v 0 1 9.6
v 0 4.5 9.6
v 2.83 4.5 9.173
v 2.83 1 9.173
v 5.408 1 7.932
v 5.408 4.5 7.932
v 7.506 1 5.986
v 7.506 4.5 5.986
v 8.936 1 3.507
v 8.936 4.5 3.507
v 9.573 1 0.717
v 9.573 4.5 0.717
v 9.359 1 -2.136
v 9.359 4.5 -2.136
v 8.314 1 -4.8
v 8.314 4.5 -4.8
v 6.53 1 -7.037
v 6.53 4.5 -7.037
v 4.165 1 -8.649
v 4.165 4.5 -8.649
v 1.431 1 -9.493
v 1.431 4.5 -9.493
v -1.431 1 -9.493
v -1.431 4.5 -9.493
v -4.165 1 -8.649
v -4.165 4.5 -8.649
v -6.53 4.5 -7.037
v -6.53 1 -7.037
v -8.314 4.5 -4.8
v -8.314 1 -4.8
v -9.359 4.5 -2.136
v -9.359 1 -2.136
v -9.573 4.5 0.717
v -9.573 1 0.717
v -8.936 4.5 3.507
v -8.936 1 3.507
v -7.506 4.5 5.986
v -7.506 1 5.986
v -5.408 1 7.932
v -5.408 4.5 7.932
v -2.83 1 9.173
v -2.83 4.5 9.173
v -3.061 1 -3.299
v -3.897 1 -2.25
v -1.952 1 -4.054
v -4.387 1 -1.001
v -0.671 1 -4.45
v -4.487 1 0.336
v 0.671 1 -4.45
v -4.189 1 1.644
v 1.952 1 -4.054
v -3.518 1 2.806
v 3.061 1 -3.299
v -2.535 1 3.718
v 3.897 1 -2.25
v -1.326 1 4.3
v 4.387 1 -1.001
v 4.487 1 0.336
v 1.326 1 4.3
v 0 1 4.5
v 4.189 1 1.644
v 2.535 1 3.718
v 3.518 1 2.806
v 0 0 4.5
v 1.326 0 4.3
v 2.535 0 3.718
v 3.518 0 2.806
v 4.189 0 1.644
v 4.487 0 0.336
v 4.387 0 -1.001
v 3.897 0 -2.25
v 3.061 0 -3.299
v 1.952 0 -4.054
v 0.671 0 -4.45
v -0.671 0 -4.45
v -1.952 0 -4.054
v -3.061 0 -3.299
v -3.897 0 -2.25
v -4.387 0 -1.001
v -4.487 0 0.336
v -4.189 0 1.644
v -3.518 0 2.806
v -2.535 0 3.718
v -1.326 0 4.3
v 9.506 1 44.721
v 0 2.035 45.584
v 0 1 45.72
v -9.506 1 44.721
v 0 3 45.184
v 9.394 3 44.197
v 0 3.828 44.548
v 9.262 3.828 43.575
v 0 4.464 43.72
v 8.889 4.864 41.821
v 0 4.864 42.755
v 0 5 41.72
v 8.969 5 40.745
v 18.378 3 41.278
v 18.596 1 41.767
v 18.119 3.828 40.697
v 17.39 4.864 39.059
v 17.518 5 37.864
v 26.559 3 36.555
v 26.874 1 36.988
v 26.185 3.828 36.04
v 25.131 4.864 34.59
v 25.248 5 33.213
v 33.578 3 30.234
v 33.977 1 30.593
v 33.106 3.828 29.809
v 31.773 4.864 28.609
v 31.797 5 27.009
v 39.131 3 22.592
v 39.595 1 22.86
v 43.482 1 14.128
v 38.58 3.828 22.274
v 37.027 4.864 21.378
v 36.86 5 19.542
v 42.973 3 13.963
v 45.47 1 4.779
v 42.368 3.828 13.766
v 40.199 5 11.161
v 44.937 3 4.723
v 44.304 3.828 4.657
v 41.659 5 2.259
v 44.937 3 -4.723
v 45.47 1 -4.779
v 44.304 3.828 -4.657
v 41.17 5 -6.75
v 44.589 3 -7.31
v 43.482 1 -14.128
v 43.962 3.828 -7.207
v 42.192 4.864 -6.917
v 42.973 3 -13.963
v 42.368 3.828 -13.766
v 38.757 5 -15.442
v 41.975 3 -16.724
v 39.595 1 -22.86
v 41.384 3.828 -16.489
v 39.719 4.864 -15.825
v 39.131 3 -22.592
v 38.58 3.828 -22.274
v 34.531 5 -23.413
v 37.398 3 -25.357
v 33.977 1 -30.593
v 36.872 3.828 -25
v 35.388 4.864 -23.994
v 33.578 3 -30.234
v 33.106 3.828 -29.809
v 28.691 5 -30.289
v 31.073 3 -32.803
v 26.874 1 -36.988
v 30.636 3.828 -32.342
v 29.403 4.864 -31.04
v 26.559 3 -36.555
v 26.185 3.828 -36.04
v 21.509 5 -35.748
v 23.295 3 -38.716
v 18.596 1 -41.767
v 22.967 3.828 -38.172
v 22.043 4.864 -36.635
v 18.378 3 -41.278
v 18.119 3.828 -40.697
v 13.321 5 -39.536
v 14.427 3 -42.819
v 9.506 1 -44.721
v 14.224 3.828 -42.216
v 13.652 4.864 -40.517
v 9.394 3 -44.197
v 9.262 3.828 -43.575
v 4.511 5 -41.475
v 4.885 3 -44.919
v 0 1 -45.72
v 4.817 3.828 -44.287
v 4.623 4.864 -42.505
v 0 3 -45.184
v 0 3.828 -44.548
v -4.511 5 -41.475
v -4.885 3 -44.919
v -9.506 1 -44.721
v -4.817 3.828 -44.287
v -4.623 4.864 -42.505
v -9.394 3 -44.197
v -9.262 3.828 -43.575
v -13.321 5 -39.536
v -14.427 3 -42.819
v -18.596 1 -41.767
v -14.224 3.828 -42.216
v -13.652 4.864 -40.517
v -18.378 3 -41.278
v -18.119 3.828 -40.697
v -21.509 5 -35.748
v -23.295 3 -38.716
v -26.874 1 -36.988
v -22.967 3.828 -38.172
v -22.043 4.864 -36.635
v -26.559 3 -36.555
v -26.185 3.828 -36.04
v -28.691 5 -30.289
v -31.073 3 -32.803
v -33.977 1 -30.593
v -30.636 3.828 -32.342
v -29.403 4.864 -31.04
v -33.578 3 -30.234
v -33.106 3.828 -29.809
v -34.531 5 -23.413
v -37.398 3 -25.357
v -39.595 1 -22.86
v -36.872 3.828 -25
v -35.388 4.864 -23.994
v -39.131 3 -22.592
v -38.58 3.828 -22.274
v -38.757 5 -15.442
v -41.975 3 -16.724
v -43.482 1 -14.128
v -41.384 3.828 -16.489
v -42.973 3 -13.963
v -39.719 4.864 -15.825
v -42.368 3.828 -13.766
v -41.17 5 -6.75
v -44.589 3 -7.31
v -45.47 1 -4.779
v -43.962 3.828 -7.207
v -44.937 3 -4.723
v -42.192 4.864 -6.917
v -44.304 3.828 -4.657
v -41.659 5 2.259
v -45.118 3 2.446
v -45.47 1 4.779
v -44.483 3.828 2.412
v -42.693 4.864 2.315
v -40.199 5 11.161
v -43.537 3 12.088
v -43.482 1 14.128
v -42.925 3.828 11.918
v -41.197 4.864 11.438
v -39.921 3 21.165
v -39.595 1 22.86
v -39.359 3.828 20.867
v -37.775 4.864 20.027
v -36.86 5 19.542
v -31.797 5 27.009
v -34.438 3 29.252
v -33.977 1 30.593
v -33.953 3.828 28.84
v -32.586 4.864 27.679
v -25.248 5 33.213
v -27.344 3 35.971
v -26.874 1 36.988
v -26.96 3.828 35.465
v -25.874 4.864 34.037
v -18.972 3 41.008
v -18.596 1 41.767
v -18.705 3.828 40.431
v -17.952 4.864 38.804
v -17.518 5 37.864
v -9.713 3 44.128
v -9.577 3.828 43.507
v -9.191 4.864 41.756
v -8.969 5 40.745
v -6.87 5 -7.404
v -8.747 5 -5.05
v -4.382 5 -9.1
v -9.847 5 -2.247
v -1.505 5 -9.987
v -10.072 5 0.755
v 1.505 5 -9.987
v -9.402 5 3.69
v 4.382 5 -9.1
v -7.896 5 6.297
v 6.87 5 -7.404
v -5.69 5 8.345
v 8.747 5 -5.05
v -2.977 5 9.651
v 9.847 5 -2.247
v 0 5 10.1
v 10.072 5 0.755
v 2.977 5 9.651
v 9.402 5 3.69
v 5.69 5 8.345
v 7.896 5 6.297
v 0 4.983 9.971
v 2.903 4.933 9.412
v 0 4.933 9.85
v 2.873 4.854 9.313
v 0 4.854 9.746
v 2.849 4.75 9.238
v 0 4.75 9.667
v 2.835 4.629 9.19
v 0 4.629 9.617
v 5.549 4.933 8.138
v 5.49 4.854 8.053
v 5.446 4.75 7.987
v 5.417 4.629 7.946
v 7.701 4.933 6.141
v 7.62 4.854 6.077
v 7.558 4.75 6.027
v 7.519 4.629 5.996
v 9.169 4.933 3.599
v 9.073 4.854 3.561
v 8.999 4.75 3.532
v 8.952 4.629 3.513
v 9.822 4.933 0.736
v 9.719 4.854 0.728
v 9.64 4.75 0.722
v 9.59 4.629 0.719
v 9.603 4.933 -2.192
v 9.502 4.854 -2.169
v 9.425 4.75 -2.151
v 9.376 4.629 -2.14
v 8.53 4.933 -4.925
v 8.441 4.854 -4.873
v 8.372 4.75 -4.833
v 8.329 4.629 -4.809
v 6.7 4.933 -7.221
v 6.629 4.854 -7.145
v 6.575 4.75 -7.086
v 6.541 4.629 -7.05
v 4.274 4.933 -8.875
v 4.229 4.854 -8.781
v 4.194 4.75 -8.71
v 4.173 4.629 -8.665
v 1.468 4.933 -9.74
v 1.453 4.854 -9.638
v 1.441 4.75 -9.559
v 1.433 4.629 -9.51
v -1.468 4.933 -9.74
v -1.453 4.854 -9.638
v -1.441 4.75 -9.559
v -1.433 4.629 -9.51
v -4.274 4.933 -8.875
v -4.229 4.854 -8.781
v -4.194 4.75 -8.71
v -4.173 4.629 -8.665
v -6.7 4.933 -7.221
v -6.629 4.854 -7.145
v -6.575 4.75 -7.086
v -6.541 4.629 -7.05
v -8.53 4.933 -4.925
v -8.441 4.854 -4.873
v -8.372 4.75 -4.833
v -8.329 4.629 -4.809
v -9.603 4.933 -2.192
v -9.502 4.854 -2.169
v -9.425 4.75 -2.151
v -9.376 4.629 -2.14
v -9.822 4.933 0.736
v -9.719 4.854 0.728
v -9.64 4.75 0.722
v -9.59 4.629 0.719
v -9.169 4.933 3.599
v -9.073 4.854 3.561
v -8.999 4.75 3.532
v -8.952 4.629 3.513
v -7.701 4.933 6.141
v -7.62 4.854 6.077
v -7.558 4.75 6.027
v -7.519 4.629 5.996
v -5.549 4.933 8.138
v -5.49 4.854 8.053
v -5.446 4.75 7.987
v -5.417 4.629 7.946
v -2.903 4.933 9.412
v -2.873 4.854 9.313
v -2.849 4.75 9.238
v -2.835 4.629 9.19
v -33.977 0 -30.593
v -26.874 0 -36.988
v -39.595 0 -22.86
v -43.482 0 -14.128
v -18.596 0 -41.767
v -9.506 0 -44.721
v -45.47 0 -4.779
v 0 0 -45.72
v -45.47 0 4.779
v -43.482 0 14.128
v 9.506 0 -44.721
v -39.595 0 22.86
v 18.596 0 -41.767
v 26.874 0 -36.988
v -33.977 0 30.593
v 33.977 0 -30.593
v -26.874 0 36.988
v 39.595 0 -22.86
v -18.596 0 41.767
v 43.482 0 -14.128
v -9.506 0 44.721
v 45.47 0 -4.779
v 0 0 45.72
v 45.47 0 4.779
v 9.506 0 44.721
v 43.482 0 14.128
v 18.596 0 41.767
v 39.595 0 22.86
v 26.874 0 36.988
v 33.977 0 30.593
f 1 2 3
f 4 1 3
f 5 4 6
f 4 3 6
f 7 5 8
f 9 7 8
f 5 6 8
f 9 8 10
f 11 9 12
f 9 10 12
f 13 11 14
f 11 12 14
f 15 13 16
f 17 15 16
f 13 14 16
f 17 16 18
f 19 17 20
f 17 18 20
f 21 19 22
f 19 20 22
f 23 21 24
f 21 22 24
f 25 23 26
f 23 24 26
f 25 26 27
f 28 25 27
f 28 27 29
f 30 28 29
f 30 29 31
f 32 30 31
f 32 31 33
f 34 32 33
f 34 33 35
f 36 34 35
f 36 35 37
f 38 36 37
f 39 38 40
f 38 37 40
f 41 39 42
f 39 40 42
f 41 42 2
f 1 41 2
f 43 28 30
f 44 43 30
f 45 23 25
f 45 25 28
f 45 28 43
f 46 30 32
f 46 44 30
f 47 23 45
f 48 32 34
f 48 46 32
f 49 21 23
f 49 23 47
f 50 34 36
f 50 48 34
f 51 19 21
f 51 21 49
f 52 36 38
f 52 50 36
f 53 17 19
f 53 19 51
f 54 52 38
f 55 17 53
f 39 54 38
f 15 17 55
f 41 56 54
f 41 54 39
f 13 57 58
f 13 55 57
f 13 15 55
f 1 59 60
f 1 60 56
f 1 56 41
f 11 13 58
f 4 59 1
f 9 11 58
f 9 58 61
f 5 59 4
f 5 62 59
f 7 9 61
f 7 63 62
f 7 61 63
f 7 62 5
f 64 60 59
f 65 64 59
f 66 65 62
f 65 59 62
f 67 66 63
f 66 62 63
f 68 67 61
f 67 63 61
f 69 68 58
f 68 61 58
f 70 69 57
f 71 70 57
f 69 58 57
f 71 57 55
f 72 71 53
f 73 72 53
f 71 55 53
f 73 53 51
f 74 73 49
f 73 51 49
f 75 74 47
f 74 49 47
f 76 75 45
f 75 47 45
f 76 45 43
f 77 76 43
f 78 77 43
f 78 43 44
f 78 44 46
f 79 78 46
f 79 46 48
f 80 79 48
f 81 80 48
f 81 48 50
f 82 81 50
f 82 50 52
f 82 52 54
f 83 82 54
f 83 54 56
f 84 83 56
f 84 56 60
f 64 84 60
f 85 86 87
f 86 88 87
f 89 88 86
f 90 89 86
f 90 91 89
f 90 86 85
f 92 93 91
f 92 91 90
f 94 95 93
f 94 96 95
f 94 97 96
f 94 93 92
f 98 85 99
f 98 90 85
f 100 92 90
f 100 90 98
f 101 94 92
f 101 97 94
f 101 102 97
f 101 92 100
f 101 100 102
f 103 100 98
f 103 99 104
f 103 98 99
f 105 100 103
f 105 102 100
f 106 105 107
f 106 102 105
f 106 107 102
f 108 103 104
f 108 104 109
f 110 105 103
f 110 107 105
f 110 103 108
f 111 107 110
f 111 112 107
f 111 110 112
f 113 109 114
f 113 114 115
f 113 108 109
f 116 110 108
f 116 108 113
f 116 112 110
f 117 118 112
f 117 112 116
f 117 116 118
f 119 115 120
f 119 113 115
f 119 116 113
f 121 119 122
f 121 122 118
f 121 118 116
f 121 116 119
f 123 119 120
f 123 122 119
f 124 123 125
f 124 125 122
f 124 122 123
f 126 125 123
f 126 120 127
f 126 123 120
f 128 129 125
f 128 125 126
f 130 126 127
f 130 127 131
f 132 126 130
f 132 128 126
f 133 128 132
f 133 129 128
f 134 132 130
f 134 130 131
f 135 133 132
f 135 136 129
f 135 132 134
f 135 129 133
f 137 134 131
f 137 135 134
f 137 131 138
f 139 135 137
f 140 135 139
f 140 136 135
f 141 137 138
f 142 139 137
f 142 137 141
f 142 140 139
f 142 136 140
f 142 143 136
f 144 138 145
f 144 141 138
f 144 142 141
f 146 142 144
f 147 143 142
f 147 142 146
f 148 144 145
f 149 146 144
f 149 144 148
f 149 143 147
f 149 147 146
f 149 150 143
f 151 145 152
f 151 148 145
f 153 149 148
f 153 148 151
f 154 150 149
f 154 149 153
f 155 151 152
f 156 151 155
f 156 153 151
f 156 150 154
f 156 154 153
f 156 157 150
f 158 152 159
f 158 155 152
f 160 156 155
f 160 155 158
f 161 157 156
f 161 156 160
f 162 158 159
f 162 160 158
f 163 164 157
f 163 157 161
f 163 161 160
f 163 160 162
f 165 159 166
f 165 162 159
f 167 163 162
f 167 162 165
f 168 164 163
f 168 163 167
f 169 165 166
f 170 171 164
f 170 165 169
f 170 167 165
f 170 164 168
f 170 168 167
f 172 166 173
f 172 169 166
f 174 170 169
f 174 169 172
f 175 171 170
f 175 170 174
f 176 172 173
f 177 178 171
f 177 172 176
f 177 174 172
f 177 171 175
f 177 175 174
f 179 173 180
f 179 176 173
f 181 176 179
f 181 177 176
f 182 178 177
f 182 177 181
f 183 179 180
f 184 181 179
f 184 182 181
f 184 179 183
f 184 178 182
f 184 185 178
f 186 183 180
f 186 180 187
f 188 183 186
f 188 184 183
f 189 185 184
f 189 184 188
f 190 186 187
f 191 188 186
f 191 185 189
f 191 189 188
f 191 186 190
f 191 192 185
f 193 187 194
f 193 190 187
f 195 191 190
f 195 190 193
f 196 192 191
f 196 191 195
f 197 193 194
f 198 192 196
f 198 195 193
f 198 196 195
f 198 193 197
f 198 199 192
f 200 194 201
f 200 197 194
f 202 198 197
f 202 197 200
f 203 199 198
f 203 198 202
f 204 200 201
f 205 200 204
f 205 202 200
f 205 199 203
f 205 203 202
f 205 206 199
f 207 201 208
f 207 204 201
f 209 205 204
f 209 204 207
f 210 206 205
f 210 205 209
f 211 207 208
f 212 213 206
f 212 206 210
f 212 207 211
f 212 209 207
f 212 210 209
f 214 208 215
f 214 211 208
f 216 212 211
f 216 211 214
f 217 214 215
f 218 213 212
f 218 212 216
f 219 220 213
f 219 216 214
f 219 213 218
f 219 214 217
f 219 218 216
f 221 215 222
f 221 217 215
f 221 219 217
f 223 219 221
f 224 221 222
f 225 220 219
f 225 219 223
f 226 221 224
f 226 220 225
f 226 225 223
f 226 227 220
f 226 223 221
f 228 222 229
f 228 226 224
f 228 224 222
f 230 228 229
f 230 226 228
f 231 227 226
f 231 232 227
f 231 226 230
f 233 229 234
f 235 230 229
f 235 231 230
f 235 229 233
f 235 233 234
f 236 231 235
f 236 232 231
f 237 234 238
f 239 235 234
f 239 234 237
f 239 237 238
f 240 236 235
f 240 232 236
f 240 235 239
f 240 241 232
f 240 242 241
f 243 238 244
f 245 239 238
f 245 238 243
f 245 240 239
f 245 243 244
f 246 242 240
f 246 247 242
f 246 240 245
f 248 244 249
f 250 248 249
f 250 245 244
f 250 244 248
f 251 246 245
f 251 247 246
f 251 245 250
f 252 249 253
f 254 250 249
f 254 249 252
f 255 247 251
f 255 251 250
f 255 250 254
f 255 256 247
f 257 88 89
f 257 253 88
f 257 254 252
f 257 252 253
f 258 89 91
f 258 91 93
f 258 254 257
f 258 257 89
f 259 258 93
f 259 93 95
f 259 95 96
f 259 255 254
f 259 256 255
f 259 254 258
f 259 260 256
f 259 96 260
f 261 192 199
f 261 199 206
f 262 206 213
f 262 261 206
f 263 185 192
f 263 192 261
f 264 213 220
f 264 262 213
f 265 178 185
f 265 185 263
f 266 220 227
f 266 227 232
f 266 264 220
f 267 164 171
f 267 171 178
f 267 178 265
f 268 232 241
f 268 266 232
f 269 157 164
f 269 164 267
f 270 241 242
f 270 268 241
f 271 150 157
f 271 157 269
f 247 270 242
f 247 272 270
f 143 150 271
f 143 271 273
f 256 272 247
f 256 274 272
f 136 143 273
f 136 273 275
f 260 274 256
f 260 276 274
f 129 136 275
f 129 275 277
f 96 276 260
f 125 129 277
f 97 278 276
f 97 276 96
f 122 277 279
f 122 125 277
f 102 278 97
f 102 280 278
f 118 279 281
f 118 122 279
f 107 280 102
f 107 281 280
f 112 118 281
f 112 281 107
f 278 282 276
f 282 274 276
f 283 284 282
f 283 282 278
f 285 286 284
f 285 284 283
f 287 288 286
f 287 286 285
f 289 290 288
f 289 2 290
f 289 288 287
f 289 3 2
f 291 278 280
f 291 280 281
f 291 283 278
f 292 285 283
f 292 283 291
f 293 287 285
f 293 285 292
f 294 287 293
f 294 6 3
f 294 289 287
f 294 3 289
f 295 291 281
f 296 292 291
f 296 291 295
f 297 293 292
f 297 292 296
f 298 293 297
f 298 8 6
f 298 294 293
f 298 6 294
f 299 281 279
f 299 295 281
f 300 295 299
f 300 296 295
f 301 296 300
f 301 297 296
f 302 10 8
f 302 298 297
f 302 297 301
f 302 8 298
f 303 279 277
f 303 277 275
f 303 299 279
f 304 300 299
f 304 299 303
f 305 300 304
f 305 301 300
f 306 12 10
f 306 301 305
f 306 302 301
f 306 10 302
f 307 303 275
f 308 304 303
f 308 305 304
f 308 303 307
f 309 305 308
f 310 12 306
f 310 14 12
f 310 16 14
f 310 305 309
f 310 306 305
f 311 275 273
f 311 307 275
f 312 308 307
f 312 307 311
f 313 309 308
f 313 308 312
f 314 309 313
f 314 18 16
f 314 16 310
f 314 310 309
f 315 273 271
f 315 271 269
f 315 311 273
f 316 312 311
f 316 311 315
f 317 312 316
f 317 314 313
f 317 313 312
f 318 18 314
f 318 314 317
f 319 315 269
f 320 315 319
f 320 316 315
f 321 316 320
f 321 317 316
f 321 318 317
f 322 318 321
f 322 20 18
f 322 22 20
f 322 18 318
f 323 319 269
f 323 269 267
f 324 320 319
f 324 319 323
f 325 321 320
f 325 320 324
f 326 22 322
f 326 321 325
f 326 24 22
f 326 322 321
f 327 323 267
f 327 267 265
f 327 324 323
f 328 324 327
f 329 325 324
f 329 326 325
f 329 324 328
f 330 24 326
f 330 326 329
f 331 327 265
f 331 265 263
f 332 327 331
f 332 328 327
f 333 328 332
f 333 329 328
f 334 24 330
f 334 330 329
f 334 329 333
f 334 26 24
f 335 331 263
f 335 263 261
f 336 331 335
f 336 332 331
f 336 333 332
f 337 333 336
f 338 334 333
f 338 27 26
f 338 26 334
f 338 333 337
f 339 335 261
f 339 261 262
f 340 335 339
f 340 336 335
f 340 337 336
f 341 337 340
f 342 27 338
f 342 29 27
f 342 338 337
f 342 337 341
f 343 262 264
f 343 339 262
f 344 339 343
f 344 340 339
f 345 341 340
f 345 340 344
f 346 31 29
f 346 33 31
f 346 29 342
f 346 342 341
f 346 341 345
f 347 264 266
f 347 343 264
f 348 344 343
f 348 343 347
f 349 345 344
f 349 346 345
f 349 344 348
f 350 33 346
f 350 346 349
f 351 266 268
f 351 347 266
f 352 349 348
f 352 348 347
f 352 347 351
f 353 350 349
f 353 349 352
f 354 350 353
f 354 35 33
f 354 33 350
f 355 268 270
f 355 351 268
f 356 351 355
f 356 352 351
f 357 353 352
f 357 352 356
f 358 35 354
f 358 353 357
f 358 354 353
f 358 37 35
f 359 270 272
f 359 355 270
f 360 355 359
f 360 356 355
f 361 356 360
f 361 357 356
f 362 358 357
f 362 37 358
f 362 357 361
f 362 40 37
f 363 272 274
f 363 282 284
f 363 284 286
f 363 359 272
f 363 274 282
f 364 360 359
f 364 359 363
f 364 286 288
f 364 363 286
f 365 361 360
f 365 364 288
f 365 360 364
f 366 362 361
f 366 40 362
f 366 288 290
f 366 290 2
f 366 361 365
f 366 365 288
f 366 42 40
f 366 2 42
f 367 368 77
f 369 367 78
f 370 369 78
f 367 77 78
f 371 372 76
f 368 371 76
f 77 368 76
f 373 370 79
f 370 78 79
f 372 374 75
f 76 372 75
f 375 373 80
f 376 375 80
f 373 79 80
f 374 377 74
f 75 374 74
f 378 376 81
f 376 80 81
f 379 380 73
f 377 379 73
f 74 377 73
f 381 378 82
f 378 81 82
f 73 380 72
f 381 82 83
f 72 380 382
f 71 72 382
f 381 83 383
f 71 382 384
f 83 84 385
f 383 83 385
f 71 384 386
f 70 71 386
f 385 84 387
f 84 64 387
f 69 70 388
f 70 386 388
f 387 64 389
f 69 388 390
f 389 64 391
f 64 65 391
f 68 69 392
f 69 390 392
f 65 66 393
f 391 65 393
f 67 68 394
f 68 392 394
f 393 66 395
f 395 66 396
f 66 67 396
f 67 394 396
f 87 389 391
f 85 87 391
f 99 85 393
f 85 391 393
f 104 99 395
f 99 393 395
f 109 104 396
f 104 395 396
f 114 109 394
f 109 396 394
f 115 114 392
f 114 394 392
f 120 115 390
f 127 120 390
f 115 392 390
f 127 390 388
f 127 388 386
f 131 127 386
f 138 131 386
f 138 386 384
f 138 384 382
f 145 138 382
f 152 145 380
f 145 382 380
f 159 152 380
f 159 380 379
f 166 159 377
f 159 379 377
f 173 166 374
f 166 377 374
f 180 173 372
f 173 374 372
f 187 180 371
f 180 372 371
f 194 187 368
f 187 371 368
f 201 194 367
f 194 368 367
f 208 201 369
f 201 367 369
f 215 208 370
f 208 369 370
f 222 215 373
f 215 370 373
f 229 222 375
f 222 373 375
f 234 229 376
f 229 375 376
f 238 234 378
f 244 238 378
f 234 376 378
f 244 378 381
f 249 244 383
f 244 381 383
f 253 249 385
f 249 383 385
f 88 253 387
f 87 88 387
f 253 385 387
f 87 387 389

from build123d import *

# Parameters (mm, degrees)
SKETCH1_R           = 45.72
BOSS_EXTRUDE1_DEPTH = 5
SKETCH2_R           = 9.6
SKETCH2_R_2         = 4.5
CUT_EXTRUDE1_DEPTH  = 4
SKETCH3_R           = 4.5
CUT_EXTRUDE2_DEPTH  = 65.781454136
FILLET1_R           = 4
FILLET2_R           = 0.5


with BuildPart() as part:
    # Sketch1 → Boss-Extrude1 (new body)
    with BuildSketch(Plane(origin=(0, 0, 0), x_dir=(1, 0, 0), z_dir=(0, 1, 0))):
        with Locations(Location((0, 0, 0), (0, 0, 270))):
            Circle(SKETCH1_R)
    extrude(amount=BOSS_EXTRUDE1_DEPTH)

    # Sketch2 → Cut-Extrude1 (cut)
    # profile 1 of 2: a face of its own
    with BuildSketch(Plane(origin=(0, 5, 0), x_dir=(1, 0, 0), z_dir=(0, 1, 0))):
        with Locations(Location((0, 0, 0), (0, 0, 270))):
            Circle(SKETCH2_R)
        Circle(SKETCH2_R_2, mode=Mode.SUBTRACT)
    # profile 2 of 2: a face of its own
    with BuildSketch(Plane(origin=(0, 5, 0), x_dir=(1, 0, 0), z_dir=(0, 1, 0))):
        Circle(SKETCH2_R_2)
    extrude(amount=-CUT_EXTRUDE1_DEPTH, mode=Mode.SUBTRACT)

    # Sketch3 → Cut-Extrude2 (cut, through all)
    with BuildSketch(Plane(origin=(0, 1, 0), x_dir=(1, 0, 0), z_dir=(0, 1, 0))):
        with Locations(Location((0, 0, 0), (0, 0, 270))):
            Circle(SKETCH3_R)
    extrude(amount=-CUT_EXTRUDE2_DEPTH, mode=Mode.SUBTRACT)

    # Fillet1
    fillet1_edges = [part.edges().sort_by_distance(p)[0] for p in [
        (0, 5, -45.72),
    ]]
    fillet(fillet1_edges, radius=FILLET1_R)

    # Fillet2
    fillet2_edges = [part.edges().sort_by_distance(p)[0] for p in [
        (0, 5, -9.6),
    ]]
    fillet(fillet2_edges, radius=FILLET2_R)


solid = part.part
